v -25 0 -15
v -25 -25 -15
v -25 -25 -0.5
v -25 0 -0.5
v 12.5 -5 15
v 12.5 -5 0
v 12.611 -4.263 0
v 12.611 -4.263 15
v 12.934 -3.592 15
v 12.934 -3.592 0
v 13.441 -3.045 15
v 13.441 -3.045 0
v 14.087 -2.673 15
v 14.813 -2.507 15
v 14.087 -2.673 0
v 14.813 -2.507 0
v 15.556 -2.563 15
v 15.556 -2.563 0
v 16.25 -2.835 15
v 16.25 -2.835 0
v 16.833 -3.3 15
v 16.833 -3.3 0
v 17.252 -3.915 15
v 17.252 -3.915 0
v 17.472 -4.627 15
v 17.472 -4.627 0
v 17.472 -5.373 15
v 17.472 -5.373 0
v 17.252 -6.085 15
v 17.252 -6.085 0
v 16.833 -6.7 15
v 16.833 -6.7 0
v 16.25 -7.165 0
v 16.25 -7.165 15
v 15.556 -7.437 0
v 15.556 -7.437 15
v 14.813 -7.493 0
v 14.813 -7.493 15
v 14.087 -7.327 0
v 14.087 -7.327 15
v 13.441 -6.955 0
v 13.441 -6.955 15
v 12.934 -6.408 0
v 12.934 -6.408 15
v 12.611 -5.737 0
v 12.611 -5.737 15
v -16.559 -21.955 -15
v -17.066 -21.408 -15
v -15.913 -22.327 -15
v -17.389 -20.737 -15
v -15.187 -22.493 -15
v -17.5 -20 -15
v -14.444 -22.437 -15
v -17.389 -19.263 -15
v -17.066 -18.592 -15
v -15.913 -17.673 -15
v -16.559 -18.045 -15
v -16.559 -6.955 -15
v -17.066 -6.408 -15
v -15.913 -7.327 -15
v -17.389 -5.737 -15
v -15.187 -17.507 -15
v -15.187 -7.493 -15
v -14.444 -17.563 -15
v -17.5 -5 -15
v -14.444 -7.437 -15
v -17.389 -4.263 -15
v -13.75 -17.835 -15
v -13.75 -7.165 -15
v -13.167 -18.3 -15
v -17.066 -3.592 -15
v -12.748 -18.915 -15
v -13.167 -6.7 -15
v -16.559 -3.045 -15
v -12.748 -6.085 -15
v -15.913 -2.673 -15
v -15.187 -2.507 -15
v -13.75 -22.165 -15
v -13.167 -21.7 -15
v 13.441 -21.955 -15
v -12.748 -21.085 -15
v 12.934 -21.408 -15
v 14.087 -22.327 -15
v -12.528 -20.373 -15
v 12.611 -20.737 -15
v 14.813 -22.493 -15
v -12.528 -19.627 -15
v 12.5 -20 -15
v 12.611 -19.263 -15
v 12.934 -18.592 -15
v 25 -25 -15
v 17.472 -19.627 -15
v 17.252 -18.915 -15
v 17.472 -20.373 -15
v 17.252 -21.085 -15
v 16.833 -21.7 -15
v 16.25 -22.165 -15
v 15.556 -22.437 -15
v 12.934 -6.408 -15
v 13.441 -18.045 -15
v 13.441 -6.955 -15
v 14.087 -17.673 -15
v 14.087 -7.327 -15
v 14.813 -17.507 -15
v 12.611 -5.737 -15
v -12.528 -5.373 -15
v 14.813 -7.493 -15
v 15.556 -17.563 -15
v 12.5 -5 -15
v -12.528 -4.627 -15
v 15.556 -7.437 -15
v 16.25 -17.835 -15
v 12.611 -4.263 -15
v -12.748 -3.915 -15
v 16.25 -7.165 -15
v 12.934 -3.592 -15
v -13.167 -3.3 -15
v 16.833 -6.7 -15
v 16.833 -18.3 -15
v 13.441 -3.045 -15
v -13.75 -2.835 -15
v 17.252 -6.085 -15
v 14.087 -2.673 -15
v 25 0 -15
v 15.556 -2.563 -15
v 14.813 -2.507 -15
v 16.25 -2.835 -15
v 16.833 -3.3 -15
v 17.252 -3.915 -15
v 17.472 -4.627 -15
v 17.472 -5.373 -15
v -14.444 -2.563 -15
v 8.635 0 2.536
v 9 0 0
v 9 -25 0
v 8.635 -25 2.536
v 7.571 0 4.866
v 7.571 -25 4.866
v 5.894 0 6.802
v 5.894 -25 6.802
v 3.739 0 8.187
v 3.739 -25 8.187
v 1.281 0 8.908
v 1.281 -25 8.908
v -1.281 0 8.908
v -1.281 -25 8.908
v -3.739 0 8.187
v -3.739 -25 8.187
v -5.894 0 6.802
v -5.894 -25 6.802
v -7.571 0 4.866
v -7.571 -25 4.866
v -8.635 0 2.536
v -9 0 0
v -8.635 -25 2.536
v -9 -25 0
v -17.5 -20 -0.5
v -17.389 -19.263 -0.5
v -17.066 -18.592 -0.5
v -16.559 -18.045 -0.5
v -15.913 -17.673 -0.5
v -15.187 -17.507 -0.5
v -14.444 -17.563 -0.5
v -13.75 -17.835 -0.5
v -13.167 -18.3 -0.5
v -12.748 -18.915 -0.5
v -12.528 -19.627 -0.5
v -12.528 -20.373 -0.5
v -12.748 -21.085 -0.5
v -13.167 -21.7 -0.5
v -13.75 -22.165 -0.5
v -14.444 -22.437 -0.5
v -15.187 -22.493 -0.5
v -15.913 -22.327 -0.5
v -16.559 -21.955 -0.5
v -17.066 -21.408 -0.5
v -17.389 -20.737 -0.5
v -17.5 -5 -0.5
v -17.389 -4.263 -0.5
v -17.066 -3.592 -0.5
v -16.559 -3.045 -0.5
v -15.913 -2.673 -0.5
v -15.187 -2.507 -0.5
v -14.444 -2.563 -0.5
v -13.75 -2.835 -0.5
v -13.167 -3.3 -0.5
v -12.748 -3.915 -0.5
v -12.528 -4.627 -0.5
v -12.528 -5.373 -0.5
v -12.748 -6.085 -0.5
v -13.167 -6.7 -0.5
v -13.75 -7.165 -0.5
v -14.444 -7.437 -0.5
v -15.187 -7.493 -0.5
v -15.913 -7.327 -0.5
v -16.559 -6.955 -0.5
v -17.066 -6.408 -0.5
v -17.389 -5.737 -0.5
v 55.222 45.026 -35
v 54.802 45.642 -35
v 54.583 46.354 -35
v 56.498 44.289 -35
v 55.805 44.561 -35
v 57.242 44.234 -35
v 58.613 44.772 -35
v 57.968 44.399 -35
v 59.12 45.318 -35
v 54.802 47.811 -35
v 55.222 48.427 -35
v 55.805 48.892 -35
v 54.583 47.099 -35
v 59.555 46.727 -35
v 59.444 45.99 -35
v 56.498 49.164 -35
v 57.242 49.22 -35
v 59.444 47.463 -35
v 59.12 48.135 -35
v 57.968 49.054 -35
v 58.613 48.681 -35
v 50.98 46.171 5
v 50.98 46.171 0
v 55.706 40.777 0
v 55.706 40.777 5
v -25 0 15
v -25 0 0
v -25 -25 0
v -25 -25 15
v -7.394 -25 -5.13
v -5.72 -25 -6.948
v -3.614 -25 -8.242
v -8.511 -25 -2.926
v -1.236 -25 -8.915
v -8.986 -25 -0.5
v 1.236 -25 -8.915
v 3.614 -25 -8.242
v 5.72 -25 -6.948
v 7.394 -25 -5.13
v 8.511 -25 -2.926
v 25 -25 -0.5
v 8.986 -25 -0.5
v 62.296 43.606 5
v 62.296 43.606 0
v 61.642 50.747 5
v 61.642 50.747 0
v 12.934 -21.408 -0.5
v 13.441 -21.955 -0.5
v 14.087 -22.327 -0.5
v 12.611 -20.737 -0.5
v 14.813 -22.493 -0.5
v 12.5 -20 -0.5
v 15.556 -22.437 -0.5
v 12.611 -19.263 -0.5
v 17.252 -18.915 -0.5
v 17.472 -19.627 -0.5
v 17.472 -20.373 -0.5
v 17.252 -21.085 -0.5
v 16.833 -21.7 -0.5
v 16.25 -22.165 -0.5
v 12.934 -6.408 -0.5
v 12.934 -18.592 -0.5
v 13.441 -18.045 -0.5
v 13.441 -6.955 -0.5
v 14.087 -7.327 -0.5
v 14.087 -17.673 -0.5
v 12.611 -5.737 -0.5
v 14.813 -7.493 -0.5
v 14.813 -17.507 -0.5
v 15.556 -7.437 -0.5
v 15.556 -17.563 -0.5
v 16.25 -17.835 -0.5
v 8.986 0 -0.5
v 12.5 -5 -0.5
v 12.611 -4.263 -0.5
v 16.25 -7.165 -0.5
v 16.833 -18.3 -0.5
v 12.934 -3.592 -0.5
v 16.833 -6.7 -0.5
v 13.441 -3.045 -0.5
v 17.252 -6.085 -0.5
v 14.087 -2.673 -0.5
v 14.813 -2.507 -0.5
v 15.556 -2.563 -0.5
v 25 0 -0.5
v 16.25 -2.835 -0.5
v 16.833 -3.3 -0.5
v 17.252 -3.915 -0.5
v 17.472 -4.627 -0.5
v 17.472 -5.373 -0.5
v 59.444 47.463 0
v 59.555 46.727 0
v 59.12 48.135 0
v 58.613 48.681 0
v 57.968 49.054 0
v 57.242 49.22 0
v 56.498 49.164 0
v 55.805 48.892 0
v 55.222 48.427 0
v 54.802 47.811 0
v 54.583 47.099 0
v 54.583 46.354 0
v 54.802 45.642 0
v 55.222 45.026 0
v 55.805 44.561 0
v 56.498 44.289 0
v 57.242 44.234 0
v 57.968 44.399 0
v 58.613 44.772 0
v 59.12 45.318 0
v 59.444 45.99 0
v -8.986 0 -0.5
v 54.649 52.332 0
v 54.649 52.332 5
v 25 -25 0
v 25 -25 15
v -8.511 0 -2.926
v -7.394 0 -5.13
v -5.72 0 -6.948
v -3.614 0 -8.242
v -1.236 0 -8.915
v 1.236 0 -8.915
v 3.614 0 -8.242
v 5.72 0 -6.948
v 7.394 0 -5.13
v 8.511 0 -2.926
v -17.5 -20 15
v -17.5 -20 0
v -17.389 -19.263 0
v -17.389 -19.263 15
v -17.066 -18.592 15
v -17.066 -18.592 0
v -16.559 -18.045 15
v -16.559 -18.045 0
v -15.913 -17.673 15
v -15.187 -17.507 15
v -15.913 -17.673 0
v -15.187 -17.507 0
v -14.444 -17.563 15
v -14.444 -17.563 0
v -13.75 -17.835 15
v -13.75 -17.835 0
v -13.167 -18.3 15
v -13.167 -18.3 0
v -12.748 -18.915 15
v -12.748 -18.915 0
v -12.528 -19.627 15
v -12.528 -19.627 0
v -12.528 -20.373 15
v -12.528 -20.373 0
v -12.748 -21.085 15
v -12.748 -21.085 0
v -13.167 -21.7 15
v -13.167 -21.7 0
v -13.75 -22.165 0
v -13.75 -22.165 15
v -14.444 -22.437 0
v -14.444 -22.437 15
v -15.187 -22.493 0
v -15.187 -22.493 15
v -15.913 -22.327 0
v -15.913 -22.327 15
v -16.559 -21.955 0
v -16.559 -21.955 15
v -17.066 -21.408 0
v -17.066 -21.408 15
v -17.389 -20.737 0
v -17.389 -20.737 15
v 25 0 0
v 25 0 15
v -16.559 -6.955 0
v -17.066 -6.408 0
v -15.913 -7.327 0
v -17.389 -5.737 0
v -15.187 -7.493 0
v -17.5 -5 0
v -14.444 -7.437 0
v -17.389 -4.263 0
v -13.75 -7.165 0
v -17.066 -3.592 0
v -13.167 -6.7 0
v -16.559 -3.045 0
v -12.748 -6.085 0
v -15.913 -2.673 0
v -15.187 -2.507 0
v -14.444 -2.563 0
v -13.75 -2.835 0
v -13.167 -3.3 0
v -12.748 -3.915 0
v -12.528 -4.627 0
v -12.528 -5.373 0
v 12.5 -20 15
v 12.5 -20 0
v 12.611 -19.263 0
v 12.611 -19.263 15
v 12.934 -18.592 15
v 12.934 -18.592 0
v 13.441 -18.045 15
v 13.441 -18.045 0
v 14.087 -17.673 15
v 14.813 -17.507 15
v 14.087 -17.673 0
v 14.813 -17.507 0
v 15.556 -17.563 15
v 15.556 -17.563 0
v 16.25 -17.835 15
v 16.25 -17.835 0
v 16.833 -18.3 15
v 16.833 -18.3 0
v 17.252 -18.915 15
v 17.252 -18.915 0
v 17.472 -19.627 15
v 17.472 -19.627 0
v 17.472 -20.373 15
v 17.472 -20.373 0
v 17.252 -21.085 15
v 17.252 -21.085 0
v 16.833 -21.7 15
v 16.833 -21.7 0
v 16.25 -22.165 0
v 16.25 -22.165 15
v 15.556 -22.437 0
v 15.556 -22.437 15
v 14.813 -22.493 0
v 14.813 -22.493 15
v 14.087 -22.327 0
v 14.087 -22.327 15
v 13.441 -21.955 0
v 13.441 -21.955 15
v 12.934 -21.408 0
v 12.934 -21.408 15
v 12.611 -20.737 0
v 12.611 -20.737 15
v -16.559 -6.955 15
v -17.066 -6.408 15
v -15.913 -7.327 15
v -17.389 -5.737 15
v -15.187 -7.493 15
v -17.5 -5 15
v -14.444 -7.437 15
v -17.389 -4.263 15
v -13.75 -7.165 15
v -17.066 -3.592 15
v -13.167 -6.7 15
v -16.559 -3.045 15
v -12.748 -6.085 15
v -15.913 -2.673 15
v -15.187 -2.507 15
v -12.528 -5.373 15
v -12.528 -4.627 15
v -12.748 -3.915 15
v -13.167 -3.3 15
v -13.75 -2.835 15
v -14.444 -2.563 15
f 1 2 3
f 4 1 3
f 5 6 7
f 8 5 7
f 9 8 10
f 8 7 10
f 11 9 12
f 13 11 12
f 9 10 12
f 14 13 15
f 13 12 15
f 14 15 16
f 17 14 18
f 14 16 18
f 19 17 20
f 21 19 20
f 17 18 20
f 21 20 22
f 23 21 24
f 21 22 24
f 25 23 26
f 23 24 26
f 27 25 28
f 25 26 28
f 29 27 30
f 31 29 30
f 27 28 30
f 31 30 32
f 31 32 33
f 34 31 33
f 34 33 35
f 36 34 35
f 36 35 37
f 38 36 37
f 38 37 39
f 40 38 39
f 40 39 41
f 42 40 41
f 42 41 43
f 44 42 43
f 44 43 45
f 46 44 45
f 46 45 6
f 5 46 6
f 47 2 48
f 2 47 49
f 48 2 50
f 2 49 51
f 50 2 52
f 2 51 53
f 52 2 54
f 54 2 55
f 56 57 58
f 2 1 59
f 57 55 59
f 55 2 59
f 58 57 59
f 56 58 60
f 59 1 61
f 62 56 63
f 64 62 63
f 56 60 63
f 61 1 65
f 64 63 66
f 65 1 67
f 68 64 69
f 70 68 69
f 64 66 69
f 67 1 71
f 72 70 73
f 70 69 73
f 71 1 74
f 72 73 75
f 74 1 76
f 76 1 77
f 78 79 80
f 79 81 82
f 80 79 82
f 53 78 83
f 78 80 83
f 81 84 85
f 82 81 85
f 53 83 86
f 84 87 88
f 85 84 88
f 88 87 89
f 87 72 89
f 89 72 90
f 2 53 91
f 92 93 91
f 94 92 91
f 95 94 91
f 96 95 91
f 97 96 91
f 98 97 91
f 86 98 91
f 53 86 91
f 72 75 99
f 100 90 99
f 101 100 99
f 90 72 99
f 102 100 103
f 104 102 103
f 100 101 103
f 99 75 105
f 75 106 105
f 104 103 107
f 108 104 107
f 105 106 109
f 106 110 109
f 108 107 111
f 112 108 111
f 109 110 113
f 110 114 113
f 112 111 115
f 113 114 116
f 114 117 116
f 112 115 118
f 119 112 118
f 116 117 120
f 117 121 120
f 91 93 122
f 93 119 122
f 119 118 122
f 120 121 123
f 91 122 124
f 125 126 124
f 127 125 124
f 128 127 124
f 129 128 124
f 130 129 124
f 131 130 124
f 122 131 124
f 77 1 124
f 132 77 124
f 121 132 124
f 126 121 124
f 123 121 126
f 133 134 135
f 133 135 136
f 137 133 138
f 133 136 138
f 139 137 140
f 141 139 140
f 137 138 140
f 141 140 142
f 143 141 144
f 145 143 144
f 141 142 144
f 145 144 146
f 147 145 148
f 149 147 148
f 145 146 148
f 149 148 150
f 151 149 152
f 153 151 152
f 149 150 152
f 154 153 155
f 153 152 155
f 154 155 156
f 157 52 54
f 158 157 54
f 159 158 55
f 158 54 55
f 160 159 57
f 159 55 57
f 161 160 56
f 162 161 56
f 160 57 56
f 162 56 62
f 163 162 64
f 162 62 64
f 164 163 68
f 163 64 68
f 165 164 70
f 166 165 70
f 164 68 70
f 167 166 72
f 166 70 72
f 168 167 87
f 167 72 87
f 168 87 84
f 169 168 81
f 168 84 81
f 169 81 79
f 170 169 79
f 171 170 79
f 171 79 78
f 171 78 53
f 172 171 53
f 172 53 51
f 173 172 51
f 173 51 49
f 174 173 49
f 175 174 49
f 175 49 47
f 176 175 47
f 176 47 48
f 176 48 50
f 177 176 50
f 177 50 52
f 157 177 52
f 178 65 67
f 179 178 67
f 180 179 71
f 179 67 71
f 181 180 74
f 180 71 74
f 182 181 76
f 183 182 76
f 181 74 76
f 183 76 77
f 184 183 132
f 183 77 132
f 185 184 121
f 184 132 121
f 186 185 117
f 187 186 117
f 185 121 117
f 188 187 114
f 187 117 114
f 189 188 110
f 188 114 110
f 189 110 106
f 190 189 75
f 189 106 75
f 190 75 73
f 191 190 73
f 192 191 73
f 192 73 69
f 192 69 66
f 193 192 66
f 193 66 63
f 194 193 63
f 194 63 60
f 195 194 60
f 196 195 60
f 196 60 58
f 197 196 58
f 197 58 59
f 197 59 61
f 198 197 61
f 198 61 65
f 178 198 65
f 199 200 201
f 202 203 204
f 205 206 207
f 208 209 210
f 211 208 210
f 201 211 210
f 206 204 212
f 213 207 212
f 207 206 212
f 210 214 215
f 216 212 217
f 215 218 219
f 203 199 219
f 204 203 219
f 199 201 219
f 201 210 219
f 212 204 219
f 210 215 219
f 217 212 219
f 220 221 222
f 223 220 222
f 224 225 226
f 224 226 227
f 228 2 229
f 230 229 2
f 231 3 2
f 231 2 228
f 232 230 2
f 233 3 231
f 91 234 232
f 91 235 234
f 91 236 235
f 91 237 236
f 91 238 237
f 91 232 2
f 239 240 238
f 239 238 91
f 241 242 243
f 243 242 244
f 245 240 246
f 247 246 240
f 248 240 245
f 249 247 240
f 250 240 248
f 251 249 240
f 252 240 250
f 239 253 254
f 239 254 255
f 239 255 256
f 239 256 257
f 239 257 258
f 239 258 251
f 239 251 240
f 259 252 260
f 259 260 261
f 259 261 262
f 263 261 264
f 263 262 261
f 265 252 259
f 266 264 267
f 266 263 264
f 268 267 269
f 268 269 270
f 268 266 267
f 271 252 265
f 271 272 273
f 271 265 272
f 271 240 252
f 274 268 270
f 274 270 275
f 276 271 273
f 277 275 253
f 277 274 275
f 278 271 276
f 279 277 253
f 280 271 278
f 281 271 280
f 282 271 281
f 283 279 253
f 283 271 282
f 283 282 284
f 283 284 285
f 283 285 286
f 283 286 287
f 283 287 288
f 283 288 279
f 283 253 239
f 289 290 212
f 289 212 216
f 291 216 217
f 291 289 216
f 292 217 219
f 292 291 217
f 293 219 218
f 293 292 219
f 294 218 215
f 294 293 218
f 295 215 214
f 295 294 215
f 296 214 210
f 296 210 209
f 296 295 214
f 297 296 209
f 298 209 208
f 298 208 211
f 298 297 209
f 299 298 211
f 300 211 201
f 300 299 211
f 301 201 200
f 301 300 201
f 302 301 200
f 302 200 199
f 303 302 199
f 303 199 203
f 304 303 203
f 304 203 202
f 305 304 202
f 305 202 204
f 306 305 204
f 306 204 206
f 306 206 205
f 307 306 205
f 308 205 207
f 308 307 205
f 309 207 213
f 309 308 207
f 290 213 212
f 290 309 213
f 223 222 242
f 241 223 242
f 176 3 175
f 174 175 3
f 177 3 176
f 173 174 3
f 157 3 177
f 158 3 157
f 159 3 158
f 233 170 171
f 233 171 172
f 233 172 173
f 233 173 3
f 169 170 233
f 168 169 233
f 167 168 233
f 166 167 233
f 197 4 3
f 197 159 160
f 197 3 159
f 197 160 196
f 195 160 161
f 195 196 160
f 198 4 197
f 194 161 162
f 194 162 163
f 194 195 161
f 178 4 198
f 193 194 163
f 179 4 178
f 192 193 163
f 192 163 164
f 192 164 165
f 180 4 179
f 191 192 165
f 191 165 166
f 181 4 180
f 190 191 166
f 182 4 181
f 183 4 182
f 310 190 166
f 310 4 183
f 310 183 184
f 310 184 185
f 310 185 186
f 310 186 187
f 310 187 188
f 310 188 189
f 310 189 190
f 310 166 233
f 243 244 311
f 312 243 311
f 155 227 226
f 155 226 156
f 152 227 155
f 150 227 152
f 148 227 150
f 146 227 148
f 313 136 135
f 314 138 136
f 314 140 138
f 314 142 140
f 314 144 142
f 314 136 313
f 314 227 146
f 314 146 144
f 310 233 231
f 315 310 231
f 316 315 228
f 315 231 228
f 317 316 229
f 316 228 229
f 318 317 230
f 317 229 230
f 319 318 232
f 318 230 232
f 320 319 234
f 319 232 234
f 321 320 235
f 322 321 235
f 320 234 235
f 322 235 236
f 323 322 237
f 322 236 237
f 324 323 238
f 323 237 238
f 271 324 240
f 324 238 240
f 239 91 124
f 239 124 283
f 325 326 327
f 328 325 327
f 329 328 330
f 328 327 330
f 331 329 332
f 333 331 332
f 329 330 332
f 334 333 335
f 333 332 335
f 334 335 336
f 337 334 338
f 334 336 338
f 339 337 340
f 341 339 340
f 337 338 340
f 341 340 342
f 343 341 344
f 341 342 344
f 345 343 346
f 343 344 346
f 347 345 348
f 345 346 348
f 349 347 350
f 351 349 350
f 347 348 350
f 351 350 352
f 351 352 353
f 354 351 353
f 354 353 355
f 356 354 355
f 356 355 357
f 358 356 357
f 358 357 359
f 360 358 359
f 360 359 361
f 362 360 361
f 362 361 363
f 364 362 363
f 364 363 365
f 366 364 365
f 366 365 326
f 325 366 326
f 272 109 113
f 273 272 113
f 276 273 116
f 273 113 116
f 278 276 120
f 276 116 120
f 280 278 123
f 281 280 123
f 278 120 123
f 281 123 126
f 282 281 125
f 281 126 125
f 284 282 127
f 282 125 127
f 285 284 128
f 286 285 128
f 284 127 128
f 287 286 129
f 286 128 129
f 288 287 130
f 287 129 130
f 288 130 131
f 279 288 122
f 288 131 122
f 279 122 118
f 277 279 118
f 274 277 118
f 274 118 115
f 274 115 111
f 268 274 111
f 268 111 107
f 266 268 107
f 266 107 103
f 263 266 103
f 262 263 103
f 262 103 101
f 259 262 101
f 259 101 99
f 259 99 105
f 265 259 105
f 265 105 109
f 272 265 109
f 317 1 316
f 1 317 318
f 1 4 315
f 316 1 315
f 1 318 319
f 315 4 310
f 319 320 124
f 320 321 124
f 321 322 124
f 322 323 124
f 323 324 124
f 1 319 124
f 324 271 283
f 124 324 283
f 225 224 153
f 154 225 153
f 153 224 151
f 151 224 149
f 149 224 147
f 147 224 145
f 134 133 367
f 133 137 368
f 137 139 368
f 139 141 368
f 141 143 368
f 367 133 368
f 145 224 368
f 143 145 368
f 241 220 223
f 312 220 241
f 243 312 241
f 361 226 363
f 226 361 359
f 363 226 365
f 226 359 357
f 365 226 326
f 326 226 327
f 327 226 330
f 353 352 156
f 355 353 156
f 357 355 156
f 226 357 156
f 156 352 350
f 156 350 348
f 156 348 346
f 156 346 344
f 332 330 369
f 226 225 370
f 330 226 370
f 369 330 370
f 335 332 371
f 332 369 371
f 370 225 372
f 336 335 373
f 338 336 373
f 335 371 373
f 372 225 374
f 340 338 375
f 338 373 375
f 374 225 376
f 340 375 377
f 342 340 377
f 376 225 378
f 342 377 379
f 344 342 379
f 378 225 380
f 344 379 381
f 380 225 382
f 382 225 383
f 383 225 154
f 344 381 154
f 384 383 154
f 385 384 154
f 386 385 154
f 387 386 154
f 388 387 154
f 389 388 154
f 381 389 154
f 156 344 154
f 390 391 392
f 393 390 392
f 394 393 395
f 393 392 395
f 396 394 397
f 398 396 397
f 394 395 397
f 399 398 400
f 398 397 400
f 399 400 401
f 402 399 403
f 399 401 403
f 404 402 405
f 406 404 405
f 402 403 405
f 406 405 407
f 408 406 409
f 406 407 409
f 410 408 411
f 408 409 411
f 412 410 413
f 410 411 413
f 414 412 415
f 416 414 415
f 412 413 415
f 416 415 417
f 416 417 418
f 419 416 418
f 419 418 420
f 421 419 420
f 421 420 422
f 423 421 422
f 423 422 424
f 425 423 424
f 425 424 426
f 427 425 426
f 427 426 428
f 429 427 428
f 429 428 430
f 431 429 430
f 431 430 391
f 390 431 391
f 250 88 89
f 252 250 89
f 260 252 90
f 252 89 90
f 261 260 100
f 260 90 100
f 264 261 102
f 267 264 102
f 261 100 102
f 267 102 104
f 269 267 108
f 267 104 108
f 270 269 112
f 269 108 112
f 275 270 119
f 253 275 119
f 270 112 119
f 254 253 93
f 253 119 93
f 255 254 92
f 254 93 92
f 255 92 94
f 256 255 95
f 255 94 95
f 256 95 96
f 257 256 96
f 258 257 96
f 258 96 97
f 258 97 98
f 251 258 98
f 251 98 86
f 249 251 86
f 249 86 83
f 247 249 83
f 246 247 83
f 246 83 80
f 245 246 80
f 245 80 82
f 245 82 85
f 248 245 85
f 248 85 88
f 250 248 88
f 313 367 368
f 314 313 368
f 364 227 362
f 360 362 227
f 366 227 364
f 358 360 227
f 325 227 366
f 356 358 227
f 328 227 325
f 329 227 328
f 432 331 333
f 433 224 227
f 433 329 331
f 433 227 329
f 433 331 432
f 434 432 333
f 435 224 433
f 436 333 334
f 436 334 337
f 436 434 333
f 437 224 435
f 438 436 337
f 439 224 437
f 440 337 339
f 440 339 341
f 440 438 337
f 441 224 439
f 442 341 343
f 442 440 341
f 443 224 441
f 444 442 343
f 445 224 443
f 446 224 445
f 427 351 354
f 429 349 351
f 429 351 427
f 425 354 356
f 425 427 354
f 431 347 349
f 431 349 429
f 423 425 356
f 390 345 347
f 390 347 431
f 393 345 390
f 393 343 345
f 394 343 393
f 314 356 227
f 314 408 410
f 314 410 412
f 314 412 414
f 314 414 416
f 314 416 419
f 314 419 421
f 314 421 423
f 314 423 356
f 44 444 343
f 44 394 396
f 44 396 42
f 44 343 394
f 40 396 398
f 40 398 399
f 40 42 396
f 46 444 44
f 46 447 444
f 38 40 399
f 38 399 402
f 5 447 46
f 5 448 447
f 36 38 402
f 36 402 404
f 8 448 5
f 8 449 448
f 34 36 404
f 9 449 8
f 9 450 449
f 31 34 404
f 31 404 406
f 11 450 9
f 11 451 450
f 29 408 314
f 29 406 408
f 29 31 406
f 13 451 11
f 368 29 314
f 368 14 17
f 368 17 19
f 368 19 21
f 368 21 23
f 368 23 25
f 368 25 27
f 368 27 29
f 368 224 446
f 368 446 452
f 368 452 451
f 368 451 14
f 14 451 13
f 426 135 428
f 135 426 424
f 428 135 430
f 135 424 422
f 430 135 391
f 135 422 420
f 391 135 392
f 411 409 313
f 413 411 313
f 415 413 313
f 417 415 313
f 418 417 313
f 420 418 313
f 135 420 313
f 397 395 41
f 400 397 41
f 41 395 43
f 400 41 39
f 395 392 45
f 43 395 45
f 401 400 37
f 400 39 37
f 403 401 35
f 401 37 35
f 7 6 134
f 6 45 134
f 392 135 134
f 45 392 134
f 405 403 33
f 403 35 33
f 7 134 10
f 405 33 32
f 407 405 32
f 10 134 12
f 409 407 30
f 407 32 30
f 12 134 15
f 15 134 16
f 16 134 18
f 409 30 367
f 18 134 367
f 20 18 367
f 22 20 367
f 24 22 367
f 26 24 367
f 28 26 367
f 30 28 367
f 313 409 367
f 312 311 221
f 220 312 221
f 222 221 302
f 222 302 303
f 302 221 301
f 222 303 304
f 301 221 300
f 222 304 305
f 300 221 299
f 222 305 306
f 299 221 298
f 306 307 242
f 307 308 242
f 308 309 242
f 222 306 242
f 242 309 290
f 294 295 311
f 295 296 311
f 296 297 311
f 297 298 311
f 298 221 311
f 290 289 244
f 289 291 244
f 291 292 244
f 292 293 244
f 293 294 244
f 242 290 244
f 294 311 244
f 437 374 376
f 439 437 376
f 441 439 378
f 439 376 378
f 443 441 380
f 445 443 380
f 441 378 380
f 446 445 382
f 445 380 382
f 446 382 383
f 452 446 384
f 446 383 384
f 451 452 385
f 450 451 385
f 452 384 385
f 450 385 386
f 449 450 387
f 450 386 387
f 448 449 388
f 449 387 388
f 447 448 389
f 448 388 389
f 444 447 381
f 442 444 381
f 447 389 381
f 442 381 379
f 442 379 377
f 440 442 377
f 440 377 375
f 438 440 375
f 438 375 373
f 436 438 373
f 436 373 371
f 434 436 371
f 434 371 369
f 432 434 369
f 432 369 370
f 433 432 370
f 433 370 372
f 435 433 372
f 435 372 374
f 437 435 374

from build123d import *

# Parameters (mm, degrees)
F0_W      = 50
F0_H      = 15
F1_DEPTH  = 25
F2_W      = 50
F2_H      = 15
F3_DEPTH  = 25
F4_R      = 9
F5_DEPTH  = 25.001
F6_W      = 84.721566
F6_H      = 73.151662
F7_DEPTH  = 0.5
F9_D      = 5
F10_R     = 2.5
F11_DEPTH = 35
F12_R     = 2.5
F13_DEPTH = 5


with BuildPart() as f1:
    # F0 (on Front) → F1 (new body)
    with BuildSketch(Plane.XZ):
        with Locations((0, -7.5)):
            Rectangle(F0_W, F0_H)
    extrude(amount=F1_DEPTH)

    # F2 (on Front) → F3 (join)
    with BuildSketch(Plane.XZ):
        with Locations((0, 7.5)):
            Rectangle(F2_W, F2_H)
    extrude(amount=F3_DEPTH)

    # F4 (on face) → F5 (cut, through all)
    with BuildSketch(Plane.XZ.offset(25)):
        Circle(F4_R)
    extrude(amount=-F5_DEPTH, mode=Mode.SUBTRACT)

    # F6 (on Top) → F7 (cut)
    with BuildSketch(Plane.XY):
        Rectangle(F6_W, F6_H)
    extrude(amount=-F7_DEPTH, mode=Mode.SUBTRACT)

    # F9 (through all)
    with Locations(Plane.XY.offset(15)):
        with Locations((-15, -5), (-15, -20), (15, -5), (15, -20)):
            Hole(F9_D / 2)


with BuildPart() as f11:
    # F10 (on Top) → F11 (new body)
    with BuildSketch(Plane.XY):
        with Locations((57.054702, 46.72651)):
            Circle(F10_R)
    extrude(amount=-F11_DEPTH)

    # F12 (on face) → F13 (join)
    with BuildSketch(Plane.XY):
        Polygon((54.648821, 52.33206), (50.980049, 46.170591), (55.706241, 40.777383), (62.29596, 43.605666), (61.642439, 50.746849), align=None)
        with Locations((57.054702, 46.72651)):
            Circle(F12_R, mode=Mode.SUBTRACT)
        with Locations((57.054702, 46.72651)):
            Circle(F12_R)
    extrude(amount=F13_DEPTH)


solid = Compound([f1.part, f11.part])
